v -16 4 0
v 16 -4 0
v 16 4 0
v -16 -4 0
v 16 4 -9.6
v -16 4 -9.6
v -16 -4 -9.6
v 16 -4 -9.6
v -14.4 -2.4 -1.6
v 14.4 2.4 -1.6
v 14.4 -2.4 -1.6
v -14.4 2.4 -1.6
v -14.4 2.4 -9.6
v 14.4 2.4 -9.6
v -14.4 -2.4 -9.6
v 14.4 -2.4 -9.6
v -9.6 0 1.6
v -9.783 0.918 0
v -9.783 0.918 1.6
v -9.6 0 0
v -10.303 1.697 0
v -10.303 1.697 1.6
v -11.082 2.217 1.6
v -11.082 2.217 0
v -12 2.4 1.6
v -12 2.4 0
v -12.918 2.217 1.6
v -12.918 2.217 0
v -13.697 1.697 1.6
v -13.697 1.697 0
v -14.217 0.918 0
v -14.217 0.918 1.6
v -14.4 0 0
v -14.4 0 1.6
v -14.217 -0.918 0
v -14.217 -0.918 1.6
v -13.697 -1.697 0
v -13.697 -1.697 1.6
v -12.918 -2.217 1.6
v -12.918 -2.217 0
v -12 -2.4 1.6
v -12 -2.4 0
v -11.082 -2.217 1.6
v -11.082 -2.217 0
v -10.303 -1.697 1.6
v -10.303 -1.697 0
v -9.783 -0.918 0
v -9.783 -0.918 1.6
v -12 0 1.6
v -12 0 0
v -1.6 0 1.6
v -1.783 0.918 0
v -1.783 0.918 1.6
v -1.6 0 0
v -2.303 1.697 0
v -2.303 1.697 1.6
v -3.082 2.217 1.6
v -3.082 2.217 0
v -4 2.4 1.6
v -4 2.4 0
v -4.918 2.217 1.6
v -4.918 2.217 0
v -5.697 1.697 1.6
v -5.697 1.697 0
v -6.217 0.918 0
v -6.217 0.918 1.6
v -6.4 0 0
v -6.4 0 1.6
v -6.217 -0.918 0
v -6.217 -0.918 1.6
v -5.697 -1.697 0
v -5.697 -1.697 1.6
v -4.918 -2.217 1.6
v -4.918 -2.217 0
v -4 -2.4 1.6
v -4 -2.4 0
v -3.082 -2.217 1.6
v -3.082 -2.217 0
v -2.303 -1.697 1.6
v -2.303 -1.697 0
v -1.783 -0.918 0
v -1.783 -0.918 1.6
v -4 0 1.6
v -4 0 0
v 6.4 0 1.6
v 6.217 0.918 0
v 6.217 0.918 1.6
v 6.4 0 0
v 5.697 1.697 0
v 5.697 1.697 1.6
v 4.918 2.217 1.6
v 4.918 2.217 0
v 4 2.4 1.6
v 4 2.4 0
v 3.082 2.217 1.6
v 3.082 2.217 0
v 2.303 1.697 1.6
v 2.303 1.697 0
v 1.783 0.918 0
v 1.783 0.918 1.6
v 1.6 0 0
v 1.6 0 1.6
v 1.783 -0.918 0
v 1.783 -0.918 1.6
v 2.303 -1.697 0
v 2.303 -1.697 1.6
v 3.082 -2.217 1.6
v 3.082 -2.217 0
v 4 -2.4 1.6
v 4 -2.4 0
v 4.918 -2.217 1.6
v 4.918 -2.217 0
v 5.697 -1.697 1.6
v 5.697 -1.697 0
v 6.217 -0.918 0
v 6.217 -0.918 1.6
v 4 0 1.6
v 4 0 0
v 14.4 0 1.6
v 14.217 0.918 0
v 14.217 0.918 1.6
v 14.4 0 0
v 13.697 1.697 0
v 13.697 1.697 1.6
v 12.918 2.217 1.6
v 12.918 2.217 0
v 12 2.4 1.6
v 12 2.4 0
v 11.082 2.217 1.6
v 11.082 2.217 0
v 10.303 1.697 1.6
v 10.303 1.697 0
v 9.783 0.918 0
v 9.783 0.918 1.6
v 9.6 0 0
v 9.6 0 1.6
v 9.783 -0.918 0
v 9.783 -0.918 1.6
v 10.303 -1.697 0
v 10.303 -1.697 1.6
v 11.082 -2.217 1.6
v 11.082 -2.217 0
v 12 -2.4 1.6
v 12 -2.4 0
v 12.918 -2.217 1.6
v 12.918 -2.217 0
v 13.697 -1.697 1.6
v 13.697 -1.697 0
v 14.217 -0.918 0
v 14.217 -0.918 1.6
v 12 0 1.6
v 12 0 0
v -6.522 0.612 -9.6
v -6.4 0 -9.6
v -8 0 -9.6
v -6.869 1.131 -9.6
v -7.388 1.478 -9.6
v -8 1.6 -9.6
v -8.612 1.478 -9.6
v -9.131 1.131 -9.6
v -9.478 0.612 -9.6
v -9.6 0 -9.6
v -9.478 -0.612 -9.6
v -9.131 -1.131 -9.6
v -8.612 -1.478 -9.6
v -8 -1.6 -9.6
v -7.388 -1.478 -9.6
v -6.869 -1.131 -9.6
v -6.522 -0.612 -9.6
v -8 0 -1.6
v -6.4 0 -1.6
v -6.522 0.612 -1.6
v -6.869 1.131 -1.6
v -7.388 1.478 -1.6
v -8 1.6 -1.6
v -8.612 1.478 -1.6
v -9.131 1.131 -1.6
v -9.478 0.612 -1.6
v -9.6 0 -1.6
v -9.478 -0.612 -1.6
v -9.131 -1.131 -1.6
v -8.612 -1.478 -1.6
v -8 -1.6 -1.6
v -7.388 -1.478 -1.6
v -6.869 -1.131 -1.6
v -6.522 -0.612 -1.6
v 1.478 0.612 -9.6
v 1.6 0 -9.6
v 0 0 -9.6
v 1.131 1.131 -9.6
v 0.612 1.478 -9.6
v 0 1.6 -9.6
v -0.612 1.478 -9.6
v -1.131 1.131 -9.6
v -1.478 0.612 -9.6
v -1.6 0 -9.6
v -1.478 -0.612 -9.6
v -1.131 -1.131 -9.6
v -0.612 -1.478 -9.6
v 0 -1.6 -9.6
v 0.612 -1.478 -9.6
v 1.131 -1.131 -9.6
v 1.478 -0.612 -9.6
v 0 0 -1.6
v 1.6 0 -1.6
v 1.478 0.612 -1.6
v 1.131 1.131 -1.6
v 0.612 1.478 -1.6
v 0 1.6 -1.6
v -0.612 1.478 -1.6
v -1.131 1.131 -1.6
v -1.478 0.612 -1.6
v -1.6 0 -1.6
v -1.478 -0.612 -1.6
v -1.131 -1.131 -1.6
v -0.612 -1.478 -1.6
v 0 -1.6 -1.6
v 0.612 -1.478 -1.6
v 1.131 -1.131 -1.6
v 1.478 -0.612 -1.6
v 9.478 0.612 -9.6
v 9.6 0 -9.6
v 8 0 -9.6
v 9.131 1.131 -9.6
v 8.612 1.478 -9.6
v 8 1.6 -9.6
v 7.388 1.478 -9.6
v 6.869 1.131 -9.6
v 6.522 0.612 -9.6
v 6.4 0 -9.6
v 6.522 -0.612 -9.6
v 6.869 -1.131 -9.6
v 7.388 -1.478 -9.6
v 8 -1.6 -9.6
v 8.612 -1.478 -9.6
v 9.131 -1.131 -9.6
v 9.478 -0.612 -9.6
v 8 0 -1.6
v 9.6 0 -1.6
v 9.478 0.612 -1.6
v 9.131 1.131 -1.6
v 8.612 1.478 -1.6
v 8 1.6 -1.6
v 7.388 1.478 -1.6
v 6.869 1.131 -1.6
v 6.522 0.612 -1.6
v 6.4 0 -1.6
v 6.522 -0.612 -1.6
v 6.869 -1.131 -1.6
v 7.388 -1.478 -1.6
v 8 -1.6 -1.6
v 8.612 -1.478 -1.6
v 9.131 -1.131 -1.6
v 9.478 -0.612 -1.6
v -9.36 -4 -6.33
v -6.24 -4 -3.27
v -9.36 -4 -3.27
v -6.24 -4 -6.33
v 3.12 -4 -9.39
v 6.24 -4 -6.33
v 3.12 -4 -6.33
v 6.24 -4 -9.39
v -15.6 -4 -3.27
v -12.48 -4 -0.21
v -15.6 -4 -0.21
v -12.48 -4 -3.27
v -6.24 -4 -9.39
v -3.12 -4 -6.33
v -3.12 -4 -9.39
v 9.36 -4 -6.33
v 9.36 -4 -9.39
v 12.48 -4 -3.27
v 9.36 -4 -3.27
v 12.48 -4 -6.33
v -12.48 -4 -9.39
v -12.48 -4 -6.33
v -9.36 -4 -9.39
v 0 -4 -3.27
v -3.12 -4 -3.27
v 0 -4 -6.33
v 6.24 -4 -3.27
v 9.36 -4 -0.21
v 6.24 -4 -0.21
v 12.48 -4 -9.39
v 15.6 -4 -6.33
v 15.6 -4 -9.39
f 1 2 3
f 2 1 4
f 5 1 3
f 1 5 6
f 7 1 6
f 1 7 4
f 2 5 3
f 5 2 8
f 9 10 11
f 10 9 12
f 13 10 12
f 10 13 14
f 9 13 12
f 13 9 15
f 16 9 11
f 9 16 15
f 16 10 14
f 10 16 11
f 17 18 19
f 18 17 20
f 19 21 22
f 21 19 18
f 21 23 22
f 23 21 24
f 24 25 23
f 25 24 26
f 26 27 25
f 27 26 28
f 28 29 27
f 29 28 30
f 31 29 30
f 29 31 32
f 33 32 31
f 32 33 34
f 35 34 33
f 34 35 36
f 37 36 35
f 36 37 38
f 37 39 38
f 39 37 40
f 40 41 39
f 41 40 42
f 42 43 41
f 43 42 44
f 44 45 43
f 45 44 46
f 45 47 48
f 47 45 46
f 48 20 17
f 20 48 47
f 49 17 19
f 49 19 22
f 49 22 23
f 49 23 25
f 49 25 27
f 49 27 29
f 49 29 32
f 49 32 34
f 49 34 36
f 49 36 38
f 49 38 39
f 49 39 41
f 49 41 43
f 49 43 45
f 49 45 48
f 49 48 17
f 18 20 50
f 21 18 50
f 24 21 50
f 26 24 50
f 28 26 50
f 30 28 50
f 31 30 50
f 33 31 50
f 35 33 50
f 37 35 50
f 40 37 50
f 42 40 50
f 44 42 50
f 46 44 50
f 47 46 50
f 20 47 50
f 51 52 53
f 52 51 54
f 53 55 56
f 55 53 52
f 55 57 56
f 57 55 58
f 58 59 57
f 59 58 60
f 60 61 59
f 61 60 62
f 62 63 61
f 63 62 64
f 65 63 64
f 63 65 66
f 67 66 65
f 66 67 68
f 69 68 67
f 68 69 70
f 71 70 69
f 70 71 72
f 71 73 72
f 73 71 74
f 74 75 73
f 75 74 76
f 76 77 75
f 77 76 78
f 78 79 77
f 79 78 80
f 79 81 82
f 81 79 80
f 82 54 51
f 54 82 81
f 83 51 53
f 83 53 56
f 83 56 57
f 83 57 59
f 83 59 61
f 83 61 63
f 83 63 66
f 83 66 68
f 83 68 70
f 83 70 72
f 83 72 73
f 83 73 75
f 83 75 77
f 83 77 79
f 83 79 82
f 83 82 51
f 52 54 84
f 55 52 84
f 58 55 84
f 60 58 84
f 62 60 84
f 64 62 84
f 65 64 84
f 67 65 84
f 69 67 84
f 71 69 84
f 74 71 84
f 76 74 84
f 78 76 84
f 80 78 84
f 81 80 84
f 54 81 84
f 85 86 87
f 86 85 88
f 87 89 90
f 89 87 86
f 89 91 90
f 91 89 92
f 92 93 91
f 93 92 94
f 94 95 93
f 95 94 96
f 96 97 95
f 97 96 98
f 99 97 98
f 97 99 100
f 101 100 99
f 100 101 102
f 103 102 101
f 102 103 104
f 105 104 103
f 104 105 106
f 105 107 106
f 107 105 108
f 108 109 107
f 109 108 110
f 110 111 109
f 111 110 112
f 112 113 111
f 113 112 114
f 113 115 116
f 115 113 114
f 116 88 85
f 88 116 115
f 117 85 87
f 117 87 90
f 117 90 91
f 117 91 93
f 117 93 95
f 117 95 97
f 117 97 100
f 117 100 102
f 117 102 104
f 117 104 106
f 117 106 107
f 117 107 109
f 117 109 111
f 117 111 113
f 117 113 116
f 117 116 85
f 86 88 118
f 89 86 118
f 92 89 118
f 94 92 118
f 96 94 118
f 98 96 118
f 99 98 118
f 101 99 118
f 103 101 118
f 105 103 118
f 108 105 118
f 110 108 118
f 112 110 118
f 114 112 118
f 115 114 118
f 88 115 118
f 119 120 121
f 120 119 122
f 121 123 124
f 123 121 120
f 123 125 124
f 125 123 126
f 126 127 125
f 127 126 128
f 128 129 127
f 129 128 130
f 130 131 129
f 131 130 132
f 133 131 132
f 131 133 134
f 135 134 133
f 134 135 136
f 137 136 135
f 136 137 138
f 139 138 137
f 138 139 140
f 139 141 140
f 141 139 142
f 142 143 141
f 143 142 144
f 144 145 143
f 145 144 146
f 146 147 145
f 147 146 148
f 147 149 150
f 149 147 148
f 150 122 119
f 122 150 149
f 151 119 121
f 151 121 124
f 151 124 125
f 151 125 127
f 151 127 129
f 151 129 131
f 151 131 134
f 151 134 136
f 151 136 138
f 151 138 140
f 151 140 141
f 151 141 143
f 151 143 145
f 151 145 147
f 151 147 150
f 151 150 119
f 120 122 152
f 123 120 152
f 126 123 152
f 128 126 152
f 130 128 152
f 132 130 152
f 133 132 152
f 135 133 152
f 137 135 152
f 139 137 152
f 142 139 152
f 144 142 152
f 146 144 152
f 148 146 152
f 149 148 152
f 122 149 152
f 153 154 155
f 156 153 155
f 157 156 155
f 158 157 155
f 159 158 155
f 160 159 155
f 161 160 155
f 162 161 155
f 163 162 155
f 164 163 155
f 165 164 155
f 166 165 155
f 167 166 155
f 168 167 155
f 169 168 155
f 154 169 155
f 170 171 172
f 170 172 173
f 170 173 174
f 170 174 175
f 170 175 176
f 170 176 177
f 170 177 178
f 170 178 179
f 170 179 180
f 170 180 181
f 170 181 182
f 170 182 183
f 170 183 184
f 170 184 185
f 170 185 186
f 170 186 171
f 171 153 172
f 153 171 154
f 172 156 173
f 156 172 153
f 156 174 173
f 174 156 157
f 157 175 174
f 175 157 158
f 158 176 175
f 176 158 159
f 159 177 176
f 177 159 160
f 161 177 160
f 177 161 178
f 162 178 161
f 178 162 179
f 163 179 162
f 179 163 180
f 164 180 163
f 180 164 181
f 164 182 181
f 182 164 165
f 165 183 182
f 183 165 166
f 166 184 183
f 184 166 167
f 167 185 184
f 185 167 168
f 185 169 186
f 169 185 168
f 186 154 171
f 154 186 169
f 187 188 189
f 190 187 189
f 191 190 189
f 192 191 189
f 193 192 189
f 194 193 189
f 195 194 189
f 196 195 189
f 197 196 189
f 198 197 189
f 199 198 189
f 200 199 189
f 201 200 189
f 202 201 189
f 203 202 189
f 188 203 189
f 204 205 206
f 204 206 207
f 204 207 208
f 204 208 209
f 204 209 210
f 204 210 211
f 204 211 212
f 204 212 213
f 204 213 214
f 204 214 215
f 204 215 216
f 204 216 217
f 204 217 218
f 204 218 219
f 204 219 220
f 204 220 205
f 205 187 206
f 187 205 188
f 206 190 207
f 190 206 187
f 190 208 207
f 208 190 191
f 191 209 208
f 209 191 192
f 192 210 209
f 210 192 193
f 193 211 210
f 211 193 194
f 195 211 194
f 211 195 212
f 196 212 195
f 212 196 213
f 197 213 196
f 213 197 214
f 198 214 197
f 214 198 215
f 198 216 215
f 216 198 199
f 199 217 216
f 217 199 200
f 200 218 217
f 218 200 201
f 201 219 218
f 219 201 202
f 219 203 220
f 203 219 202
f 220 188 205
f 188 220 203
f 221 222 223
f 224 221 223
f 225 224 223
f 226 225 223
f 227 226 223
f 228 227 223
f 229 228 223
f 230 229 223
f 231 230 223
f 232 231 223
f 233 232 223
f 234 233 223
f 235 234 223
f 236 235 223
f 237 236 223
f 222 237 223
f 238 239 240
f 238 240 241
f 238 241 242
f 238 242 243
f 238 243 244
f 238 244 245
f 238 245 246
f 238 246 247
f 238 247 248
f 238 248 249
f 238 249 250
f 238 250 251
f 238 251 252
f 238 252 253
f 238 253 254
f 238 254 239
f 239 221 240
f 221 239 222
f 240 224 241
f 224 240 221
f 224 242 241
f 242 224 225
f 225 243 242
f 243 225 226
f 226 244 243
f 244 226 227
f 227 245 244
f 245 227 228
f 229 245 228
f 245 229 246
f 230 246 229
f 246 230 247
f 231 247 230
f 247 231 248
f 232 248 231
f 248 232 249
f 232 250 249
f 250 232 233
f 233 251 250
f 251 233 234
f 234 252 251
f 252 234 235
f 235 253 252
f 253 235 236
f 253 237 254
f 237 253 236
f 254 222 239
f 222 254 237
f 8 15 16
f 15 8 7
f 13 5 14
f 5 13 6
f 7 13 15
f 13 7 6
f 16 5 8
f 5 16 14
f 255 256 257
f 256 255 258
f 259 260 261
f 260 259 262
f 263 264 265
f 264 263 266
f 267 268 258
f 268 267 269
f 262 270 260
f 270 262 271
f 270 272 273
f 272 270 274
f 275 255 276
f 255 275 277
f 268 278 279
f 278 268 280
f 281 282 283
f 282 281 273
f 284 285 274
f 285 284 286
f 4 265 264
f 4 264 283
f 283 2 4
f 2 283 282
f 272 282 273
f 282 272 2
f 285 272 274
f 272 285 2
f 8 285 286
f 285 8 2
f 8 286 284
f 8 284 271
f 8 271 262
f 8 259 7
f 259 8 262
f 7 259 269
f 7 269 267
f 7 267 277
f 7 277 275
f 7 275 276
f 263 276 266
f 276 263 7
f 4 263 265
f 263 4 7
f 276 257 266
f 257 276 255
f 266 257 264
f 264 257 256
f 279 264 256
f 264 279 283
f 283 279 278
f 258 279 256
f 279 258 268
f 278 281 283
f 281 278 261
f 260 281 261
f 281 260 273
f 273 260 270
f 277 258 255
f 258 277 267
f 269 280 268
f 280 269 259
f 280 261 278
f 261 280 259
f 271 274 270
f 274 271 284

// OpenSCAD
// file: ../p/4-4edge.scad
use <../lib.scad>
function ldraw_lib__4_4edge() = [
// 0 Circle 1.0
// 0 Name: 4-4edge.dat
// 0 Author: James Jessiman
// 0 !LDRAW_ORG Primitive UPDATE 2017-01
// 0 !LICENSE Licensed under CC BY 2.0 and CC BY 4.0 : see CAreadme.txt
// 
// 0 BFC CERTIFY CCW
  [0,"BFC","CERTIFY"],
  [0,"BFC","CCW"],
// 
// 0 !HISTORY 1998-12-15 [PTadmin] Official Update 1998-10
// 0 !HISTORY 2005-12-28 [PTadmin] Official Update 2005-01
// 0 !HISTORY 2007-06-24 [PTadmin] Header formatted for Contributor Agreement
// 0 !HISTORY 2008-07-01 [PTadmin] Official Update 2008-01
// 0 !HISTORY 2017-01-15 [Steffen] BFCed
// 0 !HISTORY 2017-12-30 [PTadmin] Official Update 2017-01
// 
// 
// 2 24 1 0 0 0.9239 0 0.3827
  [2,24,1,0,0,0.9239,0,0.3827],
// 2 24 0.9239 0 0.3827 0.7071 0 0.7071
  [2,24,0.9239,0,0.3827,0.7071,0,0.7071],
// 2 24 0.7071 0 0.7071 0.3827 0 0.9239
  [2,24,0.7071,0,0.7071,0.3827,0,0.9239],
// 2 24 0.3827 0 0.9239 0 0 1
  [2,24,0.3827,0,0.9239,0,0,1],
// 2 24 0 0 1 -0.3827 0 0.9239
  [2,24,0,0,1,-0.3827,0,0.9239],
// 2 24 -0.3827 0 0.9239 -0.7071 0 0.7071
  [2,24,-0.3827,0,0.9239,-0.7071,0,0.7071],
// 2 24 -0.7071 0 0.7071 -0.9239 0 0.3827
  [2,24,-0.7071,0,0.7071,-0.9239,0,0.3827],
// 2 24 -0.9239 0 0.3827 -1 0 -0
  [2,24,-0.9239,0,0.3827,-1,0,-0],
// 2 24 -1 0 -0 -0.9239 0 -0.3827
  [2,24,-1,0,-0,-0.9239,0,-0.3827],
// 2 24 -0.9239 0 -0.3827 -0.7071 0 -0.7071
  [2,24,-0.9239,0,-0.3827,-0.7071,0,-0.7071],
// 2 24 -0.7071 0 -0.7071 -0.3827 0 -0.9239
  [2,24,-0.7071,0,-0.7071,-0.3827,0,-0.9239],
// 2 24 -0.3827 0 -0.9239 0 0 -1
  [2,24,-0.3827,0,-0.9239,0,0,-1],
// 2 24 0 0 -1 0.3827 0 -0.9239
  [2,24,0,0,-1,0.3827,0,-0.9239],
// 2 24 0.3827 0 -0.9239 0.7071 0 -0.7071
  [2,24,0.3827,0,-0.9239,0.7071,0,-0.7071],
// 2 24 0.7071 0 -0.7071 0.9239 0 -0.3827
  [2,24,0.7071,0,-0.7071,0.9239,0,-0.3827],
// 2 24 0.9239 0 -0.3827 1 0 0
  [2,24,0.9239,0,-0.3827,1,0,0],
];
module ldraw_lib__4_4edge(step=0, col=false, unit=2/5, alt=false, line=0.2, solid=!$preview)
    makepoly(ldraw_lib__4_4edge(), step=step, col=col, unit=unit, alt=alt, line=line, solid=solid);
ldraw_lib__4_4edge(line=0.2);
// file: ../p/4-4disc.scad
use <../lib.scad>
function ldraw_lib__4_4disc() = [
// 0 Disc 1.0
// 0 Name: 4-4disc.dat
// 0 Author: James Jessiman
// 0 !LDRAW_ORG Primitive UPDATE 2002-02
// 0 !LICENSE Licensed under CC BY 2.0 and CC BY 4.0 : see CAreadme.txt
// 
// 0 BFC CERTIFY CCW
  [0,"BFC","CERTIFY"],
  [0,"BFC","CCW"],
// 
// 0 !HISTORY 1998-12-15 [PTadmin] Official Update 1998-10
// 0 !HISTORY 2002-03-23 [sbliss] Added BFC statement
// 0 !HISTORY 2002-04-25 [PTadmin] Official Update 2002-02
// 0 !HISTORY 2007-06-24 [PTadmin] Header formatted for Contributor Agreement
// 0 !HISTORY 2008-07-01 [PTadmin] Official Update 2008-01
// 
// 
// 3 16 0 0 0 1 0 0 0.9239 0 0.3827
  [3,16,0,0,0,1,0,0,0.9239,0,0.3827],
// 3 16 0 0 0 0.9239 0 0.3827 0.7071 0 0.7071
  [3,16,0,0,0,0.9239,0,0.3827,0.7071,0,0.7071],
// 3 16 0 0 0 0.7071 0 0.7071 0.3827 0 0.9239
  [3,16,0,0,0,0.7071,0,0.7071,0.3827,0,0.9239],
// 3 16 0 0 0 0.3827 0 0.9239 0 0 1
  [3,16,0,0,0,0.3827,0,0.9239,0,0,1],
// 3 16 0 0 0 0 0 1 -0.3827 0 0.9239
  [3,16,0,0,0,0,0,1,-0.3827,0,0.9239],
// 3 16 0 0 0 -0.3827 0 0.9239 -0.7071 0 0.7071
  [3,16,0,0,0,-0.3827,0,0.9239,-0.7071,0,0.7071],
// 3 16 0 0 0 -0.7071 0 0.7071 -0.9239 0 0.3827
  [3,16,0,0,0,-0.7071,0,0.7071,-0.9239,0,0.3827],
// 3 16 0 0 0 -0.9239 0 0.3827 -1 0 -0
  [3,16,0,0,0,-0.9239,0,0.3827,-1,0,-0],
// 3 16 0 0 0 -1 0 -0 -0.9239 0 -0.3827
  [3,16,0,0,0,-1,0,-0,-0.9239,0,-0.3827],
// 3 16 0 0 0 -0.9239 0 -0.3827 -0.7071 0 -0.7071
  [3,16,0,0,0,-0.9239,0,-0.3827,-0.7071,0,-0.7071],
// 3 16 0 0 0 -0.7071 0 -0.7071 -0.3827 0 -0.9239
  [3,16,0,0,0,-0.7071,0,-0.7071,-0.3827,0,-0.9239],
// 3 16 0 0 0 -0.3827 0 -0.9239 0 0 -1
  [3,16,0,0,0,-0.3827,0,-0.9239,0,0,-1],
// 3 16 0 0 0 0 0 -1 0.3827 0 -0.9239
  [3,16,0,0,0,0,0,-1,0.3827,0,-0.9239],
// 3 16 0 0 0 0.3827 0 -0.9239 0.7071 0 -0.7071
  [3,16,0,0,0,0.3827,0,-0.9239,0.7071,0,-0.7071],
// 3 16 0 0 0 0.7071 0 -0.7071 0.9239 0 -0.3827
  [3,16,0,0,0,0.7071,0,-0.7071,0.9239,0,-0.3827],
// 3 16 0 0 0 0.9239 0 -0.3827 1 0 0
  [3,16,0,0,0,0.9239,0,-0.3827,1,0,0],
// 0
];
module ldraw_lib__4_4disc(step=0, col=false, unit=2/5, alt=false, line=0.2, solid=!$preview)
    makepoly(ldraw_lib__4_4disc(), step=step, col=col, unit=unit, alt=alt, line=line, solid=solid);
ldraw_lib__4_4disc(line=0.2);
// file: ../p/4-4cyli.scad
use <../lib.scad>
$fa=1; $fs=0.2;
function ldraw_lib__4_4cyli(realsolid=false) = [
// 0 Cylinder 1.0
// 0 Name: 4-4cyli.dat
// 0 Author: James Jessiman
// 0 !LDRAW_ORG Primitive UPDATE 2005-01
// 0 !LICENSE Licensed under CC BY 2.0 and CC BY 4.0 : see CAreadme.txt
// 
// 0 BFC CERTIFY CCW
  [0,"BFC","CERTIFY"],
  [0,"BFC","CCW"],
// 
// 0 !HISTORY 1998-12-15 [PTadmin] Official Update 1998-10
// 0 !HISTORY 2002-03-23 [sbliss] Added BFC statement; merged headers from files in distributions LDraw 0.27 and Complete.
// 0 !HISTORY 2002-04-25 [PTadmin] Official Update 2002-02
// 0 !HISTORY 2004-12-14 [guyvivan] BFC CCW
// 0 !HISTORY 2005-12-28 [PTadmin] Official Update 2005-01
// 0 !HISTORY 2007-06-24 [PTadmin] Header formatted for Contributor Agreement
// 0 !HISTORY 2008-07-01 [PTadmin] Official Update 2008-01
// 
// 
// 4 16 1 1 0 0.9239 1 0.3827 0.9239 0 0.3827 1 0 0
  [4,16,1,1,0,0.9239,1,0.3827,0.9239,0,0.3827,1,0,0],
// 5 24 1 0 0 1 1 0 0.9239 0 0.3827 0.9239 0 -0.3827
  [5,24,1,0,0,1,1,0,0.9239,0,0.3827,0.9239,0,-0.3827],
// 4 16 0.9239 1 0.3827 0.7071 1 0.7071 0.7071 0 0.7071 0.9239 0 0.3827
  [4,16,0.9239,1,0.3827,0.7071,1,0.7071,0.7071,0,0.7071,0.9239,0,0.3827],
// 5 24 0.9239 0 0.3827 0.9239 1 0.3827 0.7071 0 0.7071 1 0 0
  [5,24,0.9239,0,0.3827,0.9239,1,0.3827,0.7071,0,0.7071,1,0,0],
// 4 16 0.7071 1 0.7071 0.3827 1 0.9239 0.3827 0 0.9239 0.7071 0 0.7071
  [4,16,0.7071,1,0.7071,0.3827,1,0.9239,0.3827,0,0.9239,0.7071,0,0.7071],
// 5 24 0.7071 0 0.7071 0.7071 1 0.7071 0.3827 0 0.9239 0.9239 0 0.3827
  [5,24,0.7071,0,0.7071,0.7071,1,0.7071,0.3827,0,0.9239,0.9239,0,0.3827],
// 4 16 0.3827 1 0.9239 0 1 1 0 0 1 0.3827 0 0.9239
  [4,16,0.3827,1,0.9239,0,1,1,0,0,1,0.3827,0,0.9239],
// 5 24 0.3827 0 0.9239 0.3827 1 0.9239 0 0 1 0.7071 0 0.7071
  [5,24,0.3827,0,0.9239,0.3827,1,0.9239,0,0,1,0.7071,0,0.7071],
// 4 16 0 1 1 -0.3827 1 0.9239 -0.3827 0 0.9239 0 0 1
  [4,16,0,1,1,-0.3827,1,0.9239,-0.3827,0,0.9239,0,0,1],
// 5 24 0 0 1 0 1 1 -0.3827 0 0.9239 0.3827 0 0.9239
  [5,24,0,0,1,0,1,1,-0.3827,0,0.9239,0.3827,0,0.9239],
// 4 16 -0.3827 1 0.9239 -0.7071 1 0.7071 -0.7071 0 0.7071 -0.3827 0 0.9239
  [4,16,-0.3827,1,0.9239,-0.7071,1,0.7071,-0.7071,0,0.7071,-0.3827,0,0.9239],
// 5 24 -0.3827 0 0.9239 -0.3827 1 0.9239 -0.7071 0 0.7071 0 0 1
  [5,24,-0.3827,0,0.9239,-0.3827,1,0.9239,-0.7071,0,0.7071,0,0,1],
// 4 16 -0.7071 1 0.7071 -0.9239 1 0.3827 -0.9239 0 0.3827 -0.7071 0 0.7071
  [4,16,-0.7071,1,0.7071,-0.9239,1,0.3827,-0.9239,0,0.3827,-0.7071,0,0.7071],
// 5 24 -0.7071 0 0.7071 -0.7071 1 0.7071 -0.9239 0 0.3827 -0.3827 0 0.9239
  [5,24,-0.7071,0,0.7071,-0.7071,1,0.7071,-0.9239,0,0.3827,-0.3827,0,0.9239],
// 4 16 -0.9239 1 0.3827 -1 1 0 -1 0 0 -0.9239 0 0.3827
  [4,16,-0.9239,1,0.3827,-1,1,0,-1,0,0,-0.9239,0,0.3827],
// 5 24 -0.9239 0 0.3827 -0.9239 1 0.3827 -1 0 0 -0.7071 0 0.7071
  [5,24,-0.9239,0,0.3827,-0.9239,1,0.3827,-1,0,0,-0.7071,0,0.7071],
// 4 16 -1 1 0 -0.9239 1 -0.3827 -0.9239 0 -0.3827 -1 0 0
  [4,16,-1,1,0,-0.9239,1,-0.3827,-0.9239,0,-0.3827,-1,0,0],
// 5 24 -1 0 0 -1 1 0 -0.9239 0 -0.3827 -0.9239 0 0.3827
  [5,24,-1,0,0,-1,1,0,-0.9239,0,-0.3827,-0.9239,0,0.3827],
// 4 16 -0.9239 1 -0.3827 -0.7071 1 -0.7071 -0.7071 0 -0.7071 -0.9239 0 -0.3827
  [4,16,-0.9239,1,-0.3827,-0.7071,1,-0.7071,-0.7071,0,-0.7071,-0.9239,0,-0.3827],
// 5 24 -0.9239 0 -0.3827 -0.9239 1 -0.3827 -0.7071 0 -0.7071 -1 0 0
  [5,24,-0.9239,0,-0.3827,-0.9239,1,-0.3827,-0.7071,0,-0.7071,-1,0,0],
// 4 16 -0.7071 1 -0.7071 -0.3827 1 -0.9239 -0.3827 0 -0.9239 -0.7071 0 -0.7071
  [4,16,-0.7071,1,-0.7071,-0.3827,1,-0.9239,-0.3827,0,-0.9239,-0.7071,0,-0.7071],
// 5 24 -0.7071 0 -0.7071 -0.7071 1 -0.7071 -0.3827 0 -0.9239 -0.9239 0 -0.3827
  [5,24,-0.7071,0,-0.7071,-0.7071,1,-0.7071,-0.3827,0,-0.9239,-0.9239,0,-0.3827],
// 4 16 -0.3827 1 -0.9239 0 1 -1 0 0 -1 -0.3827 0 -0.9239
  [4,16,-0.3827,1,-0.9239,0,1,-1,0,0,-1,-0.3827,0,-0.9239],
// 5 24 -0.3827 0 -0.9239 -0.3827 1 -0.9239 0 0 -1 -0.7071 0 -0.7071
  [5,24,-0.3827,0,-0.9239,-0.3827,1,-0.9239,0,0,-1,-0.7071,0,-0.7071],
// 4 16 0 1 -1 0.3827 1 -0.9239 0.3827 0 -0.9239 0 0 -1
  [4,16,0,1,-1,0.3827,1,-0.9239,0.3827,0,-0.9239,0,0,-1],
// 5 24 0 0 -1 0 1 -1 0.3827 0 -0.9239 -0.3827 0 -0.9239
  [5,24,0,0,-1,0,1,-1,0.3827,0,-0.9239,-0.3827,0,-0.9239],
// 4 16 0.3827 1 -0.9239 0.7071 1 -0.7071 0.7071 0 -0.7071 0.3827 0 -0.9239
  [4,16,0.3827,1,-0.9239,0.7071,1,-0.7071,0.7071,0,-0.7071,0.3827,0,-0.9239],
// 5 24 0.3827 0 -0.9239 0.3827 1 -0.9239 0.7071 0 -0.7071 0 0 -1
  [5,24,0.3827,0,-0.9239,0.3827,1,-0.9239,0.7071,0,-0.7071,0,0,-1],
// 4 16 0.7071 1 -0.7071 0.9239 1 -0.3827 0.9239 0 -0.3827 0.7071 0 -0.7071
  [4,16,0.7071,1,-0.7071,0.9239,1,-0.3827,0.9239,0,-0.3827,0.7071,0,-0.7071],
// 5 24 0.7071 0 -0.7071 0.7071 1 -0.7071 0.9239 0 -0.3827 0.3827 0 -0.9239
  [5,24,0.7071,0,-0.7071,0.7071,1,-0.7071,0.9239,0,-0.3827,0.3827,0,-0.9239],
// 4 16 0.9239 1 -0.3827 1 1 0 1 0 0 0.9239 0 -0.3827
  [4,16,0.9239,1,-0.3827,1,1,0,1,0,0,0.9239,0,-0.3827],
// 5 24 0.9239 0 -0.3827 0.9239 1 -0.3827 1 0 0 0.7071 0 -0.7071
  [5,24,0.9239,0,-0.3827,0.9239,1,-0.3827,1,0,0,0.7071,0,-0.7071],
// 0
];
module ldraw_lib__4_4cyli(step=0, col=false, unit=2/5, alt=false, line=0.2, solid=!$preview)
    makepoly(ldraw_lib__4_4cyli(solid), step=step, col=col, unit=unit, alt=alt, line=line, solid=solid);
ldraw_lib__4_4cyli(line=0.2);
// file: ../p/stud3.scad
use <../lib.scad>
use <4-4cyli.scad>
use <4-4disc.scad>
use <4-4edge.scad>
function ldraw_lib__stud3() = [
// 0 Stud Tube Solid
// 0 Name: stud3.dat
// 0 Author: James Jessiman
// 0 !LDRAW_ORG Primitive UPDATE 2012-01
// 0 !LICENSE Licensed under CC BY 4.0 : see CAreadme.txt
// 
// 0 BFC CERTIFY CCW
  [0,"BFC","CERTIFY"],
  [0,"BFC","CCW"],
// 
// 0 !HISTORY 2002-04-04 [sbliss] Modified for BFC compliance
// 0 !HISTORY 2002-04-25 [PTadmin] Official Update 2002-02
// 0 !HISTORY 2007-06-24 [PTadmin] Header formatted for Contributor Agreement
// 0 !HISTORY 2008-07-01 [PTadmin] Official Update 2008-01
// 0 !HISTORY 2012-02-16 [Philo] Changed to CCW
// 0 !HISTORY 2012-03-30 [PTadmin] Official Update 2012-01
// 
// 
// 1 16 0 -4 0 4 0 0 0 1 0 0 0 4 4-4edge.dat
  [1,16,0,-4,0,4,0,0,0,1,0,0,0,4, ldraw_lib__4_4edge()],
// 1 16 0 0 0 4 0 0 0 1 0 0 0 4 4-4edge.dat
  [1,16,0,0,0,4,0,0,0,1,0,0,0,4, ldraw_lib__4_4edge()],
// 1 16 0 -4 0 4 0 0 0 1 0 0 0 4 4-4disc.dat
  [1,16,0,-4,0,4,0,0,0,1,0,0,0,4, ldraw_lib__4_4disc()],
  [-1,16,0,0,0,4,0,0,0,-1,0,0,0,4, ldraw_lib__4_4disc()],
// 1 16 0 -4 0 4 0 0 0 4 0 0 0 4 4-4cyli.dat
  [1,16,0,-4,0,4,0,0,0,4,0,0,0,4, ldraw_lib__4_4cyli()],
];
module ldraw_lib__stud3(step=0, col=false, unit=2/5, alt=false, line=0.2, solid=!$preview)
    makepoly(ldraw_lib__stud3(), step=step, col=col, unit=unit, alt=alt, line=line, solid=solid);
ldraw_lib__stud3(line=0.2);
// file: ../p/stud.scad
use <../lib.scad>
use <4-4cyli.scad>
use <4-4disc.scad>
use <4-4edge.scad>
function ldraw_lib__stud() = [
// 0 Stud
// 0 Name: stud.dat
// 0 Author: James Jessiman
// 0 !LDRAW_ORG Primitive UPDATE 2012-01
// 0 !LICENSE Licensed under CC BY 4.0 : see CAreadme.txt
// 
// 0 BFC CERTIFY CCW
  [0,"BFC","CERTIFY"],
  [0,"BFC","CCW"],
// 
// 0 !HISTORY 2002-04-04 [sbliss] Modified for BFC compliance
// 0 !HISTORY 2002-04-25 [PTadmin] Official Update 2002-02
// 0 !HISTORY 2007-06-24 [PTadmin] Header formatted for Contributor Agreement
// 0 !HISTORY 2008-07-01 [PTadmin] Official Update 2008-01
// 0 !HISTORY 2012-02-16 [Philo] Changed to CCW
// 0 !HISTORY 2012-03-30 [PTadmin] Official Update 2012-01
// 
// 
// 1 16 0 0 0 6 0 0 0 1 0 0 0 6 4-4edge.dat
  [1,16,0,0,0,6,0,0,0,1,0,0,0,6, ldraw_lib__4_4edge()],
// 1 16 0 -4 0 6 0 0 0 1 0 0 0 6 4-4edge.dat
  [1,16,0,-4,0,6,0,0,0,1,0,0,0,6, ldraw_lib__4_4edge()],
// 1 16 0 0 0 6 0 0 0 -4 0 0 0 6 4-4cyli.dat
  [1,16,0,0,0,6,0,0,0,-4,0,0,0,6, ldraw_lib__4_4cyli()],
// 1 16 0 -4 0 6 0 0 0 1 0 0 0 6 4-4disc.dat
  [1,16,0,-4,0,6,0,0,0,1,0,0,0,6, ldraw_lib__4_4disc()],
  [-1,16,0,0,0,6,0,0,0,-1,0,0,0,6, ldraw_lib__4_4disc()],
];
module ldraw_lib__stud(step=0, col=false, unit=2/5, alt=false, line=0.2, solid=!$preview)
    makepoly(ldraw_lib__stud(), step=step, col=col, unit=unit, alt=alt, line=line, solid=solid);
ldraw_lib__stud(line=0.2);
// file: ../p/box5.scad
use <../lib.scad>
function ldraw_lib__box5() = [
// 0 Box with 5 Faces and All Edges
// 0 Name: box5.dat
// 0 Author: James Jessiman
// 0 !LDRAW_ORG Primitive UPDATE 2012-01
// 0 !LICENSE Licensed under CC BY 2.0 and CC BY 4.0 : see CAreadme.txt
// 
// 0 BFC CERTIFY CCW
  [0,"BFC","CERTIFY"],
  [0,"BFC","CCW"],
// 
// 0 !HISTORY 2002-04-03 [sbliss] Modified for BFC compliance
// 0 !HISTORY 2002-04-25 [PTadmin] Official Update 2002-02
// 0 !HISTORY 2007-06-24 [PTadmin] Header formatted for Contributor Agreement
// 0 !HISTORY 2008-07-01 [PTadmin] Official Update 2008-01
// 0 !HISTORY 2012-02-16 [Philo] Changed to CCW
// 0 !HISTORY 2012-03-30 [PTadmin] Official Update 2012-01
// 
// 
// 2 24 1 1 1 -1 1 1
  [2,24,1,1,1,-1,1,1],
// 2 24 -1 1 1 -1 1 -1
  [2,24,-1,1,1,-1,1,-1],
// 2 24 -1 1 -1 1 1 -1
  [2,24,-1,1,-1,1,1,-1],
// 2 24 1 1 -1 1 1 1
  [2,24,1,1,-1,1,1,1],
// 2 24 1 0 1 -1 0 1
  [2,24,1,0,1,-1,0,1],
// 2 24 -1 0 1 -1 0 -1
  [2,24,-1,0,1,-1,0,-1],
// 2 24 -1 0 -1 1 0 -1
  [2,24,-1,0,-1,1,0,-1],
// 2 24 1 0 -1 1 0 1
  [2,24,1,0,-1,1,0,1],
// 2 24 1 0 1 1 1 1
  [2,24,1,0,1,1,1,1],
// 2 24 -1 0 1 -1 1 1
  [2,24,-1,0,1,-1,1,1],
// 2 24 1 0 -1 1 1 -1
  [2,24,1,0,-1,1,1,-1],
// 2 24 -1 0 -1 -1 1 -1
  [2,24,-1,0,-1,-1,1,-1],
// 4 16 -1 1 1 1 1 1 1 1 -1 -1 1 -1
  [4,16,-1,1,1,1,1,1,1,1,-1,-1,1,-1],
// 4 16 -1 1 1 -1 0 1 1 0 1 1 1 1
  [4,16,-1,1,1,-1,0,1,1,0,1,1,1,1],
// 4 16 -1 1 -1 -1 0 -1 -1 0 1 -1 1 1
  [4,16,-1,1,-1,-1,0,-1,-1,0,1,-1,1,1],
// 4 16 1 1 -1 1 0 -1 -1 0 -1 -1 1 -1
  [4,16,1,1,-1,1,0,-1,-1,0,-1,-1,1,-1],
// 4 16 1 1 1 1 0 1 1 0 -1 1 1 -1
  [4,16,1,1,1,1,0,1,1,0,-1,1,1,-1],
];
makepoly(ldraw_lib__box5(), line=0.2);
// file: ../p/box4t.scad
use <../lib.scad>
function ldraw_lib__box4t() = [
// 0 Box with 4 Adjacent Faces and All Edges
// 0 Name: box4t.dat
// 0 Author: Tore Eriksson [Tore_Eriksson]
// 0 !LDRAW_ORG Primitive UPDATE 2003-02
// 0 !LICENSE Licensed under CC BY 2.0 and CC BY 4.0 : see CAreadme.txt
// 
// 0 BFC CERTIFY CCW
  [0,"BFC","CERTIFY"],
  [0,"BFC","CCW"],
// 
// 0 !HISTORY 1997-09-29 [PTadmin] Official Update 1997-15
// 0 !HISTORY 2002-08-31 [izanette] Modified with WINDZ for BFC compliance
// 0 !HISTORY 2003-08-01 [PTadmin] Official Update 2003-02
// 0 !HISTORY 2007-06-24 [PTadmin] Header formatted for Contributor Agreement
// 0 !HISTORY 2008-07-01 [PTadmin] Official Update 2008-01
// 
// 
// 2 24 1 1 1 -1 1 1
  [2,24,1,1,1,-1,1,1],
// 2 24 -1 1 1 -1 1 -1
  [2,24,-1,1,1,-1,1,-1],
// 2 24 -1 1 -1 1 1 -1
  [2,24,-1,1,-1,1,1,-1],
// 2 24 1 1 -1 1 1 1
  [2,24,1,1,-1,1,1,1],
// 2 24 1 0 1 -1 0 1
  [2,24,1,0,1,-1,0,1],
// 2 24 -1 0 1 -1 0 -1
  [2,24,-1,0,1,-1,0,-1],
// 2 24 -1 0 -1 1 0 -1
  [2,24,-1,0,-1,1,0,-1],
// 2 24 1 0 -1 1 0 1
  [2,24,1,0,-1,1,0,1],
// 2 24 1 0 1 1 1 1
  [2,24,1,0,1,1,1,1],
// 2 24 -1 0 1 -1 1 1
  [2,24,-1,0,1,-1,1,1],
// 2 24 1 0 -1 1 1 -1
  [2,24,1,0,-1,1,1,-1],
// 2 24 -1 0 -1 -1 1 -1
  [2,24,-1,0,-1,-1,1,-1],
// 4 16 1 1 1 1 1 -1 -1 1 -1 -1 1 1
  [4,16,1,1,1,1,1,-1,-1,1,-1,-1,1,1],
// 4 16 1 1 1 -1 1 1 -1 0 1 1 0 1
  [4,16,1,1,1,-1,1,1,-1,0,1,1,0,1],
// 4 16 -1 1 1 -1 1 -1 -1 0 -1 -1 0 1
  [4,16,-1,1,1,-1,1,-1,-1,0,-1,-1,0,1],
// 0 4 16 -1 1 -1 -1 0 -1 1 0 -1 1 1 -1
// 4 16 1 1 -1 1 1 1 1 0 1 1 0 -1
  [4,16,1,1,-1,1,1,1,1,0,1,1,0,-1],
// 0
];
makepoly(ldraw_lib__box4t(), line=0.2);
// file: s/3010s01.scad
use <../../lib.scad>
use <../../p/box4t.scad>
use <../../p/box5.scad>
use <../../p/stud.scad>
use <../../p/stud3.scad>
$fa=1; $fs=0.2;
function ldraw_lib__s__3010s01(realsolid=false) = [
// 0 ~Brick  1 x  4 without Front Face
// 0 Name: s\3010s01.dat
// 0 Author: Tony Hafner [hafhead]
// 0 !LDRAW_ORG Subpart UPDATE 2003-02
// 0 !LICENSE Licensed under CC BY 2.0 and CC BY 4.0 : see CAreadme.txt
// 
// 0 BFC CERTIFY CW
  [0,"BFC","CERTIFY"],
  [0,"BFC","CW"],
// 
// 0 !HISTORY 2003-08-01 [PTadmin] Official Update 2003-02
// 0 !HISTORY 2007-08-29 [PTadmin] Header formatted for Contributor Agreement
// 0 !HISTORY 2008-07-01 [PTadmin] Official Update 2008-01
// 
// 
// 1 16 0 24 0 40 0 0 0 -24 0 0 0 10 box4t.dat
  [1,16,0,24,0,40,0,0,0,-24,0,0,0,10, ldraw_lib__box4t(realsolid)],
// 0 BFC INVERTNEXT
  [0,"BFC","INVERTNEXT"],
// 1 16 0 24 0 36 0 0 0 -20 0 0 0 6 box5.dat
  [1,16,0,24,0,36,0,0,0,-20,0,0,0,6, ldraw_lib__box5(realsolid)],
// 1 16 -30 0 0 1 0 0 0 1 0 0 0 1 stud.dat
  [1,16,-30,0,0,1,0,0,0,1,0,0,0,1, ldraw_lib__stud(realsolid)],
// 1 16 -10 0 0 1 0 0 0 1 0 0 0 1 stud.dat
  [1,16,-10,0,0,1,0,0,0,1,0,0,0,1, ldraw_lib__stud(realsolid)],
// 1 16 10 0 0 1 0 0 0 1 0 0 0 1 stud.dat
  [1,16,10,0,0,1,0,0,0,1,0,0,0,1, ldraw_lib__stud(realsolid)],
// 1 16 30 0 0 1 0 0 0 1 0 0 0 1 stud.dat
  [1,16,30,0,0,1,0,0,0,1,0,0,0,1, ldraw_lib__stud(realsolid)],
// 1 16 -20 4 0 1 0 0 0 -5 0 0 0 1 stud3.dat
  [1,16,-20,4,0,1,0,0,0,-5,0,0,0,1, ldraw_lib__stud3(realsolid)],
// 1 16 0 4 0 1 0 0 0 -5 0 0 0 1 stud3.dat
  [1,16,0,4,0,1,0,0,0,-5,0,0,0,1, ldraw_lib__stud3(realsolid)],
// 1 16 20 4 0 1 0 0 0 -5 0 0 0 1 stud3.dat
  [1,16,20,4,0,1,0,0,0,-5,0,0,0,1, ldraw_lib__stud3(realsolid)],
// 4 16 -40 24 -10 40 24 -10 36 24 -6 -36 24 -6
  [4,16,-40,24,-10,40,24,-10,36,24,-6,-36,24,-6],
// 4 16 -40 24 10 -36 24 6 36 24 6 40 24 10
  [4,16,-40,24,10,-36,24,6,36,24,6,40,24,10],
// 4 16 -40 24 -10 -36 24 -6 -36 24 6 -40 24 10
  [4,16,-40,24,-10,-36,24,-6,-36,24,6,-40,24,10],
// 4 16 40 24 -10 40 24 10 36 24 6 36 24 -6
  [4,16,40,24,-10,40,24,10,36,24,6,36,24,-6],
// 0
];
module ldraw_lib__s__3010s01(step=0, col=false, unit=2/5, alt=false, line=0.2, solid=!$preview)
    makepoly(ldraw_lib__s__3010s01(solid), step=step, col=col, unit=unit, alt=alt, line=line, solid=solid);
ldraw_lib__s__3010s01(line=0.2);
// main file
use <../lib.scad>
use <s/3010s01.scad>
function ldraw_lib__3010pzw() = [
// 0 Brick  1 x  4 with  2 Dark Blue Squares,  4 Blue Squares and  4 Medium Blue Squares Pattern
// 0 Name: 3010pzw.dat
// 0 Author: Vincent Messenet [Cheenzo]
// 0 !LDRAW_ORG Part UPDATE 2020-01
// 0 !LICENSE Licensed under CC BY 4.0 : see CAreadme.txt
// 
// 0 BFC CERTIFY CCW
  [0,"BFC","CERTIFY"],
  [0,"BFC","CCW"],
// 
// 0 !KEYWORDS Brickheadz, Bricklink 3010pb246, Minecraft, Rebrickable 3010pr0051
// 0 !KEYWORDS Set 41612, Steve
// 
// 0 !HISTORY 2020-06-28 [PTadmin] Official Update 2020-01
// 
// 
// 1 16 0 0 0 1 0 0 0 1 0 0 0 1 s\3010s01.dat
  [1,16,0,0,0,1,0,0,0,1,0,0,0,1, ldraw_lib__s__3010s01()],
// 
// 4 272 -23.4 8.175 -10 -23.4 15.825 -10 -15.6 15.825 -10 -15.6 8.175 -10
  [4,272,-23.4,8.175,-10,-23.4,15.825,-10,-15.6,15.825,-10,-15.6,8.175,-10],
// 4 272 7.8 15.825 -10 7.8 23.475 -10 15.6 23.475 -10 15.6 15.825 -10
  [4,272,7.8,15.825,-10,7.8,23.475,-10,15.6,23.475,-10,15.6,15.825,-10],
// 
// 4 1 -39 .525 -10 -39 8.175 -10 -31.2 8.175 -10 -31.2 .525 -10
  [4,1,-39,.525,-10,-39,8.175,-10,-31.2,8.175,-10,-31.2,.525,-10],
// 4 1 -15.6 15.825 -10 -15.6 23.475 -10 -7.8 23.475 -10 -7.8 15.825 -10
  [4,1,-15.6,15.825,-10,-15.6,23.475,-10,-7.8,23.475,-10,-7.8,15.825,-10],
// 4 1 15.6 15.825 -10 15.6 23.475 -10 23.4 23.475 -10 23.4 15.825 -10
  [4,1,15.6,15.825,-10,15.6,23.475,-10,23.4,23.475,-10,23.4,15.825,-10],
// 4 1 23.4 8.175 -10 23.4 15.825 -10 31.2 15.825 -10 31.2 8.175 -10
  [4,1,23.4,8.175,-10,23.4,15.825,-10,31.2,15.825,-10,31.2,8.175,-10],
// 
// 4 73 -31.2 15.825 -10 -31.2 23.475 -10 -23.4 23.475 -10 -23.4 15.825 -10
  [4,73,-31.2,15.825,-10,-31.2,23.475,-10,-23.4,23.475,-10,-23.4,15.825,-10],
// 4 73 0 8.175 -10 -7.8 8.175 -10 -7.8 15.825 -10 0 15.825 -10
  [4,73,0,8.175,-10,-7.8,8.175,-10,-7.8,15.825,-10,0,15.825,-10],
// 4 73 15.6 .525 -10 15.6 8.175 -10 23.4 8.175 -10 23.4 .525 -10
  [4,73,15.6,.525,-10,15.6,8.175,-10,23.4,8.175,-10,23.4,.525,-10],
// 4 73 31.2 15.825 -10 31.2 23.475 -10 39 23.475 -10 39 15.825 -10
  [4,73,31.2,15.825,-10,31.2,23.475,-10,39,23.475,-10,39,15.825,-10],
// 
// 3 16 -40 0 -10 -39 .525 -10 -31.2 .525 -10
  [3,16,-40,0,-10,-39,.525,-10,-31.2,.525,-10],
// 3 16 -40 0 -10 -31.2 .525 -10 15.6 .525 -10
  [3,16,-40,0,-10,-31.2,.525,-10,15.6,.525,-10],
// 4 16 23.4 .525 -10 40 0 -10 -40 0 -10 15.6 .525 -10
  [4,16,23.4,.525,-10,40,0,-10,-40,0,-10,15.6,.525,-10],
// 4 16 31.2 8.175 -10 40 0 -10 23.4 .525 -10 23.4 8.175 -10
  [4,16,31.2,8.175,-10,40,0,-10,23.4,.525,-10,23.4,8.175,-10],
// 4 16 39 15.825 -10 40 0 -10 31.2 8.175 -10 31.2 15.825 -10
  [4,16,39,15.825,-10,40,0,-10,31.2,8.175,-10,31.2,15.825,-10],
// 4 16 39 23.475 -10 40 24 -10 40 0 -10 39 15.825 -10
  [4,16,39,23.475,-10,40,24,-10,40,0,-10,39,15.825,-10],
// 3 16 40 24 -10 39 23.475 -10 31.2 23.475 -10
  [3,16,40,24,-10,39,23.475,-10,31.2,23.475,-10],
// 3 16 40 24 -10 31.2 23.475 -10 23.4 23.475 -10
  [3,16,40,24,-10,31.2,23.475,-10,23.4,23.475,-10],
// 3 16 40 24 -10 23.4 23.475 -10 15.6 23.475 -10
  [3,16,40,24,-10,23.4,23.475,-10,15.6,23.475,-10],
// 4 16 -40 24 -10 40 24 -10 15.6 23.475 -10 7.8 23.475 -10
  [4,16,-40,24,-10,40,24,-10,15.6,23.475,-10,7.8,23.475,-10],
// 3 16 -40 24 -10 7.8 23.475 -10 -7.8 23.475 -10
  [3,16,-40,24,-10,7.8,23.475,-10,-7.8,23.475,-10],
// 3 16 -40 24 -10 -7.8 23.475 -10 -15.6 23.475 -10
  [3,16,-40,24,-10,-7.8,23.475,-10,-15.6,23.475,-10],
// 3 16 -40 24 -10 -15.6 23.475 -10 -23.4 23.475 -10
  [3,16,-40,24,-10,-15.6,23.475,-10,-23.4,23.475,-10],
// 3 16 -40 24 -10 -23.4 23.475 -10 -31.2 23.475 -10
  [3,16,-40,24,-10,-23.4,23.475,-10,-31.2,23.475,-10],
// 3 16 -40 24 -10 -31.2 23.475 -10 -31.2 15.825 -10
  [3,16,-40,24,-10,-31.2,23.475,-10,-31.2,15.825,-10],
// 4 16 -31.2 8.175 -10 -39 8.175 -10 -40 24 -10 -31.2 15.825 -10
  [4,16,-31.2,8.175,-10,-39,8.175,-10,-40,24,-10,-31.2,15.825,-10],
// 4 16 -39 .525 -10 -40 0 -10 -40 24 -10 -39 8.175 -10
  [4,16,-39,.525,-10,-40,0,-10,-40,24,-10,-39,8.175,-10],
// 4 16 -31.2 15.825 -10 -23.4 15.825 -10 -23.4 8.175 -10 -31.2 8.175 -10
  [4,16,-31.2,15.825,-10,-23.4,15.825,-10,-23.4,8.175,-10,-31.2,8.175,-10],
// 3 16 -31.2 8.175 -10 -23.4 8.175 -10 -31.2 .525 -10
  [3,16,-31.2,8.175,-10,-23.4,8.175,-10,-31.2,.525,-10],
// 3 16 -31.2 .525 -10 -23.4 8.175 -10 -15.6 8.175 -10
  [3,16,-31.2,.525,-10,-23.4,8.175,-10,-15.6,8.175,-10],
// 4 16 15.6 .525 -10 -31.2 .525 -10 -15.6 8.175 -10 -7.8 8.175 -10
  [4,16,15.6,.525,-10,-31.2,.525,-10,-15.6,8.175,-10,-7.8,8.175,-10],
// 3 16 15.6 .525 -10 -7.8 8.175 -10 0 8.175 -10
  [3,16,15.6,.525,-10,-7.8,8.175,-10,0,8.175,-10],
// 4 16 -7.8 15.825 -10 -7.8 8.175 -10 -15.6 8.175 -10 -15.6 15.825 -10
  [4,16,-7.8,15.825,-10,-7.8,8.175,-10,-15.6,8.175,-10,-15.6,15.825,-10],
// 4 16 15.6 .525 -10 0 8.175 -10 7.8 15.825 -10 15.6 8.175 -10
  [4,16,15.6,.525,-10,0,8.175,-10,7.8,15.825,-10,15.6,8.175,-10],
// 4 16 23.4 8.175 -10 15.6 8.175 -10 7.8 15.825 -10 15.6 15.825 -10
  [4,16,23.4,8.175,-10,15.6,8.175,-10,7.8,15.825,-10,15.6,15.825,-10],
// 3 16 23.4 8.175 -10 15.6 15.825 -10 23.4 15.825 -10
  [3,16,23.4,8.175,-10,15.6,15.825,-10,23.4,15.825,-10],
// 4 16 -15.6 23.475 -10 -15.6 15.825 -10 -23.4 15.825 -10 -23.4 23.475 -10
  [4,16,-15.6,23.475,-10,-15.6,15.825,-10,-23.4,15.825,-10,-23.4,23.475,-10],
// 4 16 7.8 23.475 -10 0 15.825 -10 -7.8 15.825 -10 -7.8 23.475 -10
  [4,16,7.8,23.475,-10,0,15.825,-10,-7.8,15.825,-10,-7.8,23.475,-10],
// 4 16 0 8.175 -10 0 15.825 -10 7.8 23.475 -10 7.8 15.825 -10
  [4,16,0,8.175,-10,0,15.825,-10,7.8,23.475,-10,7.8,15.825,-10],
// 4 16 31.2 15.825 -10 23.4 15.825 -10 23.4 23.475 -10 31.2 23.475 -10
  [4,16,31.2,15.825,-10,23.4,15.825,-10,23.4,23.475,-10,31.2,23.475,-10],
];
module ldraw_lib__3010pzw(step=0, col=false, unit=2/5, alt=false, line=0.2, solid=!$preview)
    makepoly(ldraw_lib__3010pzw(), step=step, col=col, unit=unit, alt=alt, line=line, solid=solid);
ldraw_lib__3010pzw(line=0.2);
